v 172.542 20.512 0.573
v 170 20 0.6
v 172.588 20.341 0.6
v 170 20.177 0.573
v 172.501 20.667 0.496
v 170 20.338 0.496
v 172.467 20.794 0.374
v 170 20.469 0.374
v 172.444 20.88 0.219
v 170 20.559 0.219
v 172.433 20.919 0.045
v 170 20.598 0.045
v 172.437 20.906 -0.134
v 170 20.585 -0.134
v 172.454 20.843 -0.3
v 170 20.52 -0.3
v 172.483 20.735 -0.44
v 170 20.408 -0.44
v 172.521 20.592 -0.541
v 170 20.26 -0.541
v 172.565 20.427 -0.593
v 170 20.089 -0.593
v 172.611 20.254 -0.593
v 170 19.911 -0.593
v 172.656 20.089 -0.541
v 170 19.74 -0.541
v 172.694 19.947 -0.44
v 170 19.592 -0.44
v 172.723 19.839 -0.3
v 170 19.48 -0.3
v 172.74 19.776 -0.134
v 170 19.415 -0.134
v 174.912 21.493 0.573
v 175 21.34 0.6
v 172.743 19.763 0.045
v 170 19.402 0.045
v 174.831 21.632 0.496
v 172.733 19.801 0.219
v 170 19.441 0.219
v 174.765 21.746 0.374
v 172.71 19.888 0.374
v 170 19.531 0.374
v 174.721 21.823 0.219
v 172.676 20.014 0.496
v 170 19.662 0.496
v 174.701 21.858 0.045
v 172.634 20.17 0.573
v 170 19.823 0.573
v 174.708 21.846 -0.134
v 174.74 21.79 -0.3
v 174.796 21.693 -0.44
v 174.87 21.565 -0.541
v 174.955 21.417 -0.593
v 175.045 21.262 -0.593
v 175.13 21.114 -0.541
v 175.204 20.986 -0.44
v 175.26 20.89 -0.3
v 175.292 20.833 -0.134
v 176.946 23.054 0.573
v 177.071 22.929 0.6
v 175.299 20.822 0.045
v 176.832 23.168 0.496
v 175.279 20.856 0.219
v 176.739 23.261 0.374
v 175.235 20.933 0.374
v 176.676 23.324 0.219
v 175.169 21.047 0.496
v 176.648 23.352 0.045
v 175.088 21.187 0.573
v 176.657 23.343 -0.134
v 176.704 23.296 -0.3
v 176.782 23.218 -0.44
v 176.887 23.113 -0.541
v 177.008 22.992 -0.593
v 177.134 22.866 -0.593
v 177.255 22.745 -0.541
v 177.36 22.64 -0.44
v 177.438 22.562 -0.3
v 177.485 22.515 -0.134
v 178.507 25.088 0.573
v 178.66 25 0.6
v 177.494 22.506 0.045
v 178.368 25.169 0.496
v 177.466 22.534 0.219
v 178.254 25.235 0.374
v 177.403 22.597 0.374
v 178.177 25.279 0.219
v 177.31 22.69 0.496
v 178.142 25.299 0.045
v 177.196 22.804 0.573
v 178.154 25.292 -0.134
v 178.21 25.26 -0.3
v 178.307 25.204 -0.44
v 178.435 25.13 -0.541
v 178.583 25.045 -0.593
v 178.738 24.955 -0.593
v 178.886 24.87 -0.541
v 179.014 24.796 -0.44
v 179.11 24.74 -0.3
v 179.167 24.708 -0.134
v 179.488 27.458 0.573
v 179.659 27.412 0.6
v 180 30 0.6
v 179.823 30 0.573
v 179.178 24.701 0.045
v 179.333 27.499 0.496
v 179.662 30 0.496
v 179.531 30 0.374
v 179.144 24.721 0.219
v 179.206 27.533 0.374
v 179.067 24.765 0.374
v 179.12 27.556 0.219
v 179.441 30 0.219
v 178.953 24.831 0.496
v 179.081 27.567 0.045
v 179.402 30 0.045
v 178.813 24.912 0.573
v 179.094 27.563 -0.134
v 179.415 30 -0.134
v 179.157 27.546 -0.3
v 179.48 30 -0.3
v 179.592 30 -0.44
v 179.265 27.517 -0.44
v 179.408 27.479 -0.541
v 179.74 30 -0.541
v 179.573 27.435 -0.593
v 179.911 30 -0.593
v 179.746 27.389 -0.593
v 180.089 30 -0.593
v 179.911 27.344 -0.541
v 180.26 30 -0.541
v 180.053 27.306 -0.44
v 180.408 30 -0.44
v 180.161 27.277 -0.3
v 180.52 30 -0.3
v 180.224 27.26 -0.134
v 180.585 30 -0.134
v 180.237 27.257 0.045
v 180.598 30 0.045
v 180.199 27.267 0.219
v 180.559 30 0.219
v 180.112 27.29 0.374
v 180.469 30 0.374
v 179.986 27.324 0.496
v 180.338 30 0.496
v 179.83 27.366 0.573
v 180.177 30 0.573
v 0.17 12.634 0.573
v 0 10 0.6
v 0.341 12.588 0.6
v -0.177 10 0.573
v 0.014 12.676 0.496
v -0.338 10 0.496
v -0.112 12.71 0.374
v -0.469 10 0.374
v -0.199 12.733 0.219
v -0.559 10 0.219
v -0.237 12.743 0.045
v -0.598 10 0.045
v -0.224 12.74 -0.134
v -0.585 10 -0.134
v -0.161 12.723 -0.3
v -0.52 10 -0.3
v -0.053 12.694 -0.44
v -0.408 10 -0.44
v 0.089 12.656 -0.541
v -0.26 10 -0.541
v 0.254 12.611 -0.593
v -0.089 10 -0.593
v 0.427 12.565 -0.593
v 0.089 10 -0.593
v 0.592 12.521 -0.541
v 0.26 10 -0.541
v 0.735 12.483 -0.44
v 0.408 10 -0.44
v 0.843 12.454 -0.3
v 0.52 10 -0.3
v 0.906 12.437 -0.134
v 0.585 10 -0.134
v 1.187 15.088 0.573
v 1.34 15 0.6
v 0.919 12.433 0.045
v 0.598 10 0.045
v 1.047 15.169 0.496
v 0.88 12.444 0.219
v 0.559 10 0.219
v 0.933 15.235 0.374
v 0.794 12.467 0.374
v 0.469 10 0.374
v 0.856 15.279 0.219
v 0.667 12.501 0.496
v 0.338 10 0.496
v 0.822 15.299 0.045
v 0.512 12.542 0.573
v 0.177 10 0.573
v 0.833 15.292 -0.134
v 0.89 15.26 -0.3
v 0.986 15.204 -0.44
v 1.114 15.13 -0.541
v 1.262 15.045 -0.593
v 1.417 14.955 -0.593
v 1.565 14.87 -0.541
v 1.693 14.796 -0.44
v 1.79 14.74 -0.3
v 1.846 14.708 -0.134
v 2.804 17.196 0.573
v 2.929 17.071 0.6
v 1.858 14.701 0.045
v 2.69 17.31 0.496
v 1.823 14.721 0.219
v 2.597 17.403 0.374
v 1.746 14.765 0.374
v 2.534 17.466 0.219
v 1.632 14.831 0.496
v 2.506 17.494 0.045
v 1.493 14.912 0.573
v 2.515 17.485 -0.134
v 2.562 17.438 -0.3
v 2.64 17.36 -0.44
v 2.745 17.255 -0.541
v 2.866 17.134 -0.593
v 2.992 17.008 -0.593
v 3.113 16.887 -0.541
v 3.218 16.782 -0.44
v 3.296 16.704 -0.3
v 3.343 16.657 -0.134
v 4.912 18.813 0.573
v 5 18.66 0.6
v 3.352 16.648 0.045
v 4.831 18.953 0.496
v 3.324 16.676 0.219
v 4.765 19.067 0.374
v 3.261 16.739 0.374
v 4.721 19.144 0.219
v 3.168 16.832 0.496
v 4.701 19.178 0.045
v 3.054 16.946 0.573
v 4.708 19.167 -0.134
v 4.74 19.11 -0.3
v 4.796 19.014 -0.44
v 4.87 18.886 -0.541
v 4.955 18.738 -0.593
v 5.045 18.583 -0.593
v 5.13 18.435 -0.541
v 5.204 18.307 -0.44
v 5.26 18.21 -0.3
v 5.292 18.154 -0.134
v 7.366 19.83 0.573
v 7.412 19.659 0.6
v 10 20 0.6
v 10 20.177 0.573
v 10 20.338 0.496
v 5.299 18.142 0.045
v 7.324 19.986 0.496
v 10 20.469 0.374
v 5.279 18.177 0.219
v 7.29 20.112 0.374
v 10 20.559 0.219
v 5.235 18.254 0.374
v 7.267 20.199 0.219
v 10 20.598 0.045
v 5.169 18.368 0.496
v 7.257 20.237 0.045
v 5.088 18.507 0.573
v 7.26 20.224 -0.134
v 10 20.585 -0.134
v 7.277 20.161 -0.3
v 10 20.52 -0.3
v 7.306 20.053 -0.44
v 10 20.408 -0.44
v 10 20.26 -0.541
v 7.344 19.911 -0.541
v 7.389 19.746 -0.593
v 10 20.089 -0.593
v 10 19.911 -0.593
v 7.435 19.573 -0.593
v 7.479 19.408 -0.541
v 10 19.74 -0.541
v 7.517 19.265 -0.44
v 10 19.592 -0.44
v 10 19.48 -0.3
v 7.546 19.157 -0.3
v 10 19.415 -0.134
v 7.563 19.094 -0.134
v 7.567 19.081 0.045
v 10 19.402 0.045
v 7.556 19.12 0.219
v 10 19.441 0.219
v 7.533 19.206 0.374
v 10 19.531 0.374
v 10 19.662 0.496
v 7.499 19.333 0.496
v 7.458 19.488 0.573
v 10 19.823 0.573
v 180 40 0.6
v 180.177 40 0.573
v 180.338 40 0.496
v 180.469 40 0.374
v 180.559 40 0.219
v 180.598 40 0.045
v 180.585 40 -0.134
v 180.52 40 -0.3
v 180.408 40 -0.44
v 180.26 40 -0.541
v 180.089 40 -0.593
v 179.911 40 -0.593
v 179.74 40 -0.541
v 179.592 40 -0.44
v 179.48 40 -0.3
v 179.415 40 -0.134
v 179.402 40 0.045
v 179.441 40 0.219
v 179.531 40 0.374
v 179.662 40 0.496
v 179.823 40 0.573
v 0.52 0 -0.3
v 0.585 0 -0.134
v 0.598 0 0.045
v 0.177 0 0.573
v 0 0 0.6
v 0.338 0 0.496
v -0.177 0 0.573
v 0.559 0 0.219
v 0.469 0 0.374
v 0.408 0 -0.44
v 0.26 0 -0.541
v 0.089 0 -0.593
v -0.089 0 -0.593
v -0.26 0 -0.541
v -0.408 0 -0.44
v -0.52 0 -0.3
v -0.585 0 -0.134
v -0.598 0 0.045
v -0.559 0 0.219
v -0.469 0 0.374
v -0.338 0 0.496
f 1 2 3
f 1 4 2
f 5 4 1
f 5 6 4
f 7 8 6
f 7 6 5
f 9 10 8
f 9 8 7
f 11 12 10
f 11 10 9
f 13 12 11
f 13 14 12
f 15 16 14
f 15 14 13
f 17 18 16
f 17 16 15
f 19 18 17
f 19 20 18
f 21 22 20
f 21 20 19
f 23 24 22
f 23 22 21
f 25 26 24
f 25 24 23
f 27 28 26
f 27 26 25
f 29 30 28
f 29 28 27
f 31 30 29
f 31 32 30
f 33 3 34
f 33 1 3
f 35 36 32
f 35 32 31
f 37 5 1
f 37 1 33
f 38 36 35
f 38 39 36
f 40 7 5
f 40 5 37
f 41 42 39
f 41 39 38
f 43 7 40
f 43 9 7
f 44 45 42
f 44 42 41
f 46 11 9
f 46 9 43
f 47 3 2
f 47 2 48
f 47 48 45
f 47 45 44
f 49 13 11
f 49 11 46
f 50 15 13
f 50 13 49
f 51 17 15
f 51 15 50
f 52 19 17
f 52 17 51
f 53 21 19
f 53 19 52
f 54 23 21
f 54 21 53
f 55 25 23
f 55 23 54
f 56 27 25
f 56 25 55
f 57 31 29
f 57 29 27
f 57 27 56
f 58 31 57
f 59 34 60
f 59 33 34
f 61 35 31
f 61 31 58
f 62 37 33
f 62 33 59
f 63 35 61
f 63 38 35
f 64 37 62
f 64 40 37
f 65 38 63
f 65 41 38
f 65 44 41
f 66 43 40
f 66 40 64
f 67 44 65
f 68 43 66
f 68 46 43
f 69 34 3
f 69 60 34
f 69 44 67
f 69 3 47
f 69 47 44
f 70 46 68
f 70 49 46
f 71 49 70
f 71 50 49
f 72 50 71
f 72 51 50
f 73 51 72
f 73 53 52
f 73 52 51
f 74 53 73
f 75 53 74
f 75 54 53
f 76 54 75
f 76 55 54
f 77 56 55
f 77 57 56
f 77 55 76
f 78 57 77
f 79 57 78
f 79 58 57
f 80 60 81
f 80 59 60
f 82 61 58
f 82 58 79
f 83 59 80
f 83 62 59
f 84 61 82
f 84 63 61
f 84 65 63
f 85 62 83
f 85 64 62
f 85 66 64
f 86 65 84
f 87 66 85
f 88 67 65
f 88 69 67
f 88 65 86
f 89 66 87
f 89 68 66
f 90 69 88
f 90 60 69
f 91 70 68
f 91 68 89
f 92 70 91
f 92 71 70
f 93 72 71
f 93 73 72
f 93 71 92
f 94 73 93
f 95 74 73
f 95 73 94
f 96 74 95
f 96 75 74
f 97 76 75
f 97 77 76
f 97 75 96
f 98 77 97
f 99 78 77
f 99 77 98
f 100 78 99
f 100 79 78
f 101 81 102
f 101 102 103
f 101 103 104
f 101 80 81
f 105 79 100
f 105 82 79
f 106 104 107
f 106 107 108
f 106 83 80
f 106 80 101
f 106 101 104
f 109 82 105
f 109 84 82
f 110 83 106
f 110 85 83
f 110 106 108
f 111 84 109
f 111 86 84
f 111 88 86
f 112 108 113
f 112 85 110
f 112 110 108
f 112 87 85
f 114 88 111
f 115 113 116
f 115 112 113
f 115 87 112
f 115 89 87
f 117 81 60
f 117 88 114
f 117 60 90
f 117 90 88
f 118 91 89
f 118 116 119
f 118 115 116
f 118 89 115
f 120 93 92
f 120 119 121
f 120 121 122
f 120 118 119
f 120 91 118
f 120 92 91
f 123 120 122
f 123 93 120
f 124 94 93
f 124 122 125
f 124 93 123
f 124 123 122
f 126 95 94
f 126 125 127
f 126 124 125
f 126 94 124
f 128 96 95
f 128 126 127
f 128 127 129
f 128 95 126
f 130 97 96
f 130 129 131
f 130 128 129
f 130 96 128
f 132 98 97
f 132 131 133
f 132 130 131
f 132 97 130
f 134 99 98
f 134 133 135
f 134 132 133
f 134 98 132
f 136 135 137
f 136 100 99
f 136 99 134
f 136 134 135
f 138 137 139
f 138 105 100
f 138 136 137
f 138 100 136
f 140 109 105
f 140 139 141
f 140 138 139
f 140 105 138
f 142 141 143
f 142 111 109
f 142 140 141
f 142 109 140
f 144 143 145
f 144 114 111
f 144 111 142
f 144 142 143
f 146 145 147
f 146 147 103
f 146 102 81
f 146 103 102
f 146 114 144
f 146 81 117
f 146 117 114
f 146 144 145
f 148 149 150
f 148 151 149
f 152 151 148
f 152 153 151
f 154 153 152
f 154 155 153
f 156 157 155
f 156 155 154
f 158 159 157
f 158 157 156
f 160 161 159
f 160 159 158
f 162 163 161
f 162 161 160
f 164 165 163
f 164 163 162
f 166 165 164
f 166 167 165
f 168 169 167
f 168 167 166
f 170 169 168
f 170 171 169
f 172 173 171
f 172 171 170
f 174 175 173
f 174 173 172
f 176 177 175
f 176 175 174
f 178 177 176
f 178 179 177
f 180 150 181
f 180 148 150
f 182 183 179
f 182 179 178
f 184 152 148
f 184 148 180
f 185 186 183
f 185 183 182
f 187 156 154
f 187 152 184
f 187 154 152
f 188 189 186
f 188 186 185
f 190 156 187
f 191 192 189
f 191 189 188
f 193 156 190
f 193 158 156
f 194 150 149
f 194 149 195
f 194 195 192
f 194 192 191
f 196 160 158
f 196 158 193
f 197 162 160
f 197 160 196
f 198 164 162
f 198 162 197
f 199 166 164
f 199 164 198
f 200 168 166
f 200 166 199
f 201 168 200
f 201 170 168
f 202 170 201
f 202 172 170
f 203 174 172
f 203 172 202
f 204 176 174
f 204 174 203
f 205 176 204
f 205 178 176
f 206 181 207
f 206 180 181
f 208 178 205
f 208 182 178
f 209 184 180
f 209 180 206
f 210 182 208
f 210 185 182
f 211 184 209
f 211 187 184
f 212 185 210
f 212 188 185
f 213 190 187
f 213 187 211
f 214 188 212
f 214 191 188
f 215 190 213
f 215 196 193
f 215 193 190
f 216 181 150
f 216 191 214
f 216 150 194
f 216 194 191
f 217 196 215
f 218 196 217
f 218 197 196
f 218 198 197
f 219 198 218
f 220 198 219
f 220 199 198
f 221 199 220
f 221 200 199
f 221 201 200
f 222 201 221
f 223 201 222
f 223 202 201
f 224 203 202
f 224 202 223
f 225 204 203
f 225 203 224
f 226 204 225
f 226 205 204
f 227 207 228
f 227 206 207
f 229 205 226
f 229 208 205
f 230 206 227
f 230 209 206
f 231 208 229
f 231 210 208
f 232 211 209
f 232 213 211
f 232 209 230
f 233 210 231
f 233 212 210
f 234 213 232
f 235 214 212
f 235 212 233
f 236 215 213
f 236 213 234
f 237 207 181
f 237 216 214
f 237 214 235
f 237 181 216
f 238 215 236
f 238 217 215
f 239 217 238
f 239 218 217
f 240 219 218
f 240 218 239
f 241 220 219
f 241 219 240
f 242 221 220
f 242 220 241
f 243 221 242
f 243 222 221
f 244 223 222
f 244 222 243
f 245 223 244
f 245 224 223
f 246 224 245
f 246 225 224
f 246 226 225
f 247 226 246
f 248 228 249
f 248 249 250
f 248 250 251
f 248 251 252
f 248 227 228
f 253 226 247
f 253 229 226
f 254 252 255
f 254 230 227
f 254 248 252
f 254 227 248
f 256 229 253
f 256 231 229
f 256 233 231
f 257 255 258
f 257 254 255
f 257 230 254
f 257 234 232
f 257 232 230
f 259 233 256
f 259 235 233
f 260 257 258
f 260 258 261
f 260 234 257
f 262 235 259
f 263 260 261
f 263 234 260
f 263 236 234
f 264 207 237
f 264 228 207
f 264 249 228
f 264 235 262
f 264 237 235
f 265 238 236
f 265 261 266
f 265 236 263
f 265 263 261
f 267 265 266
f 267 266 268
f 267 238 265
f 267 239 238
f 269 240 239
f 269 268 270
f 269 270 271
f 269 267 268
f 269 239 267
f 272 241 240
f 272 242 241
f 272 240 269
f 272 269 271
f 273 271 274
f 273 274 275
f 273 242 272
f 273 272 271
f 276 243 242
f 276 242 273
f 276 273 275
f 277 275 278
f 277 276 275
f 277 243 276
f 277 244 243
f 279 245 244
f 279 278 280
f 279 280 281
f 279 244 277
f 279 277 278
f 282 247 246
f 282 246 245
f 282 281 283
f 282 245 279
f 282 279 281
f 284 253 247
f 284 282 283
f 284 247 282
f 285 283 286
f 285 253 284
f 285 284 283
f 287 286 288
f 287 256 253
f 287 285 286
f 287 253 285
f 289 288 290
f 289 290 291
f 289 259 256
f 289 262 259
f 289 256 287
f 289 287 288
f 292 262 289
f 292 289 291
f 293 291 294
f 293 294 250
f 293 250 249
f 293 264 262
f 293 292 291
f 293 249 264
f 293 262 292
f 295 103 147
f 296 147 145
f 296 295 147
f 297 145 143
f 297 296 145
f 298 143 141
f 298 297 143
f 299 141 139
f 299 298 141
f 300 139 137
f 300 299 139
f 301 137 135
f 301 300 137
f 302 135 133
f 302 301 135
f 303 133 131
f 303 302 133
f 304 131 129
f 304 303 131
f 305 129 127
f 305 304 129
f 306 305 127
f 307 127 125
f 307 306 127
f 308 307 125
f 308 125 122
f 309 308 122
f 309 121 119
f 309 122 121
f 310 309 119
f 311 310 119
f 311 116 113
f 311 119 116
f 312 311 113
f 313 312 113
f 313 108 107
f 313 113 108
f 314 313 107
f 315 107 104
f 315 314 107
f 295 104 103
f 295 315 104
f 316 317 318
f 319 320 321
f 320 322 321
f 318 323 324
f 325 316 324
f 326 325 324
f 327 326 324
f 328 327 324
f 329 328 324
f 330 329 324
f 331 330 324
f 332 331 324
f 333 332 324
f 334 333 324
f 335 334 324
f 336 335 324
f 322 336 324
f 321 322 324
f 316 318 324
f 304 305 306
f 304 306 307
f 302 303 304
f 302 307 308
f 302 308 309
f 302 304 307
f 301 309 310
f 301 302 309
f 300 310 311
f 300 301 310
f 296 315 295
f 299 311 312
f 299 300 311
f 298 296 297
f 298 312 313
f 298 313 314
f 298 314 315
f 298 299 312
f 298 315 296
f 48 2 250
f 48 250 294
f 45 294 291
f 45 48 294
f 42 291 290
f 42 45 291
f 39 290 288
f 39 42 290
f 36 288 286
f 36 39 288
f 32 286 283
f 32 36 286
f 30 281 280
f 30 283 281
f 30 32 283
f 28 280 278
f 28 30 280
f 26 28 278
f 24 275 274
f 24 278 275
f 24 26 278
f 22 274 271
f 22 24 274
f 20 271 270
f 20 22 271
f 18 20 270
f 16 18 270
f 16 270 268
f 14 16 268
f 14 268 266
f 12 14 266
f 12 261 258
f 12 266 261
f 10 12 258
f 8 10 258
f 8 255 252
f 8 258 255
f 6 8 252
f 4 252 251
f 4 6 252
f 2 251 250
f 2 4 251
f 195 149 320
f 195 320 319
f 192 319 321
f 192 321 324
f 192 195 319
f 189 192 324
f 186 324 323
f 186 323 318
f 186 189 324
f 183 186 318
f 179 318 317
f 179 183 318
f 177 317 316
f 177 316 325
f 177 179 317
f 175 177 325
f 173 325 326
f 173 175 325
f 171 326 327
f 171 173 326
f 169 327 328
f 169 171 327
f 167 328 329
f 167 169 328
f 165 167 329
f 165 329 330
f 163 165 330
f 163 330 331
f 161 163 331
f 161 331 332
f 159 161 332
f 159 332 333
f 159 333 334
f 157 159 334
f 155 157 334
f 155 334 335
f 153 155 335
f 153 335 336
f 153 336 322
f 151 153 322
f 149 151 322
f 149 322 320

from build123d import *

# Parameters (mm, degrees)
SWEEP1_PROFILE_R = 0.6


with BuildPart() as part:
    # Sweep1: sweep along a path in Sketch1
    with BuildLine(Plane.XY) as sweep1_path:
        Line((0, 0), (0, 10))
        ThreePointArc((0, 10), (2.928932188, 17.071067812), (10, 20))
        Line((10, 20), (170, 20))
        ThreePointArc((170, 20), (177.071067812, 22.928932188), (180, 30))
        Line((180, 30), (180, 40))
    # Sweep1 profile (on start of the path) → Sweep1 (sweep)
    with BuildSketch(Plane.ZX):
        Circle(SWEEP1_PROFILE_R)
    sweep(path=sweep1_path.line)


solid = part.part
